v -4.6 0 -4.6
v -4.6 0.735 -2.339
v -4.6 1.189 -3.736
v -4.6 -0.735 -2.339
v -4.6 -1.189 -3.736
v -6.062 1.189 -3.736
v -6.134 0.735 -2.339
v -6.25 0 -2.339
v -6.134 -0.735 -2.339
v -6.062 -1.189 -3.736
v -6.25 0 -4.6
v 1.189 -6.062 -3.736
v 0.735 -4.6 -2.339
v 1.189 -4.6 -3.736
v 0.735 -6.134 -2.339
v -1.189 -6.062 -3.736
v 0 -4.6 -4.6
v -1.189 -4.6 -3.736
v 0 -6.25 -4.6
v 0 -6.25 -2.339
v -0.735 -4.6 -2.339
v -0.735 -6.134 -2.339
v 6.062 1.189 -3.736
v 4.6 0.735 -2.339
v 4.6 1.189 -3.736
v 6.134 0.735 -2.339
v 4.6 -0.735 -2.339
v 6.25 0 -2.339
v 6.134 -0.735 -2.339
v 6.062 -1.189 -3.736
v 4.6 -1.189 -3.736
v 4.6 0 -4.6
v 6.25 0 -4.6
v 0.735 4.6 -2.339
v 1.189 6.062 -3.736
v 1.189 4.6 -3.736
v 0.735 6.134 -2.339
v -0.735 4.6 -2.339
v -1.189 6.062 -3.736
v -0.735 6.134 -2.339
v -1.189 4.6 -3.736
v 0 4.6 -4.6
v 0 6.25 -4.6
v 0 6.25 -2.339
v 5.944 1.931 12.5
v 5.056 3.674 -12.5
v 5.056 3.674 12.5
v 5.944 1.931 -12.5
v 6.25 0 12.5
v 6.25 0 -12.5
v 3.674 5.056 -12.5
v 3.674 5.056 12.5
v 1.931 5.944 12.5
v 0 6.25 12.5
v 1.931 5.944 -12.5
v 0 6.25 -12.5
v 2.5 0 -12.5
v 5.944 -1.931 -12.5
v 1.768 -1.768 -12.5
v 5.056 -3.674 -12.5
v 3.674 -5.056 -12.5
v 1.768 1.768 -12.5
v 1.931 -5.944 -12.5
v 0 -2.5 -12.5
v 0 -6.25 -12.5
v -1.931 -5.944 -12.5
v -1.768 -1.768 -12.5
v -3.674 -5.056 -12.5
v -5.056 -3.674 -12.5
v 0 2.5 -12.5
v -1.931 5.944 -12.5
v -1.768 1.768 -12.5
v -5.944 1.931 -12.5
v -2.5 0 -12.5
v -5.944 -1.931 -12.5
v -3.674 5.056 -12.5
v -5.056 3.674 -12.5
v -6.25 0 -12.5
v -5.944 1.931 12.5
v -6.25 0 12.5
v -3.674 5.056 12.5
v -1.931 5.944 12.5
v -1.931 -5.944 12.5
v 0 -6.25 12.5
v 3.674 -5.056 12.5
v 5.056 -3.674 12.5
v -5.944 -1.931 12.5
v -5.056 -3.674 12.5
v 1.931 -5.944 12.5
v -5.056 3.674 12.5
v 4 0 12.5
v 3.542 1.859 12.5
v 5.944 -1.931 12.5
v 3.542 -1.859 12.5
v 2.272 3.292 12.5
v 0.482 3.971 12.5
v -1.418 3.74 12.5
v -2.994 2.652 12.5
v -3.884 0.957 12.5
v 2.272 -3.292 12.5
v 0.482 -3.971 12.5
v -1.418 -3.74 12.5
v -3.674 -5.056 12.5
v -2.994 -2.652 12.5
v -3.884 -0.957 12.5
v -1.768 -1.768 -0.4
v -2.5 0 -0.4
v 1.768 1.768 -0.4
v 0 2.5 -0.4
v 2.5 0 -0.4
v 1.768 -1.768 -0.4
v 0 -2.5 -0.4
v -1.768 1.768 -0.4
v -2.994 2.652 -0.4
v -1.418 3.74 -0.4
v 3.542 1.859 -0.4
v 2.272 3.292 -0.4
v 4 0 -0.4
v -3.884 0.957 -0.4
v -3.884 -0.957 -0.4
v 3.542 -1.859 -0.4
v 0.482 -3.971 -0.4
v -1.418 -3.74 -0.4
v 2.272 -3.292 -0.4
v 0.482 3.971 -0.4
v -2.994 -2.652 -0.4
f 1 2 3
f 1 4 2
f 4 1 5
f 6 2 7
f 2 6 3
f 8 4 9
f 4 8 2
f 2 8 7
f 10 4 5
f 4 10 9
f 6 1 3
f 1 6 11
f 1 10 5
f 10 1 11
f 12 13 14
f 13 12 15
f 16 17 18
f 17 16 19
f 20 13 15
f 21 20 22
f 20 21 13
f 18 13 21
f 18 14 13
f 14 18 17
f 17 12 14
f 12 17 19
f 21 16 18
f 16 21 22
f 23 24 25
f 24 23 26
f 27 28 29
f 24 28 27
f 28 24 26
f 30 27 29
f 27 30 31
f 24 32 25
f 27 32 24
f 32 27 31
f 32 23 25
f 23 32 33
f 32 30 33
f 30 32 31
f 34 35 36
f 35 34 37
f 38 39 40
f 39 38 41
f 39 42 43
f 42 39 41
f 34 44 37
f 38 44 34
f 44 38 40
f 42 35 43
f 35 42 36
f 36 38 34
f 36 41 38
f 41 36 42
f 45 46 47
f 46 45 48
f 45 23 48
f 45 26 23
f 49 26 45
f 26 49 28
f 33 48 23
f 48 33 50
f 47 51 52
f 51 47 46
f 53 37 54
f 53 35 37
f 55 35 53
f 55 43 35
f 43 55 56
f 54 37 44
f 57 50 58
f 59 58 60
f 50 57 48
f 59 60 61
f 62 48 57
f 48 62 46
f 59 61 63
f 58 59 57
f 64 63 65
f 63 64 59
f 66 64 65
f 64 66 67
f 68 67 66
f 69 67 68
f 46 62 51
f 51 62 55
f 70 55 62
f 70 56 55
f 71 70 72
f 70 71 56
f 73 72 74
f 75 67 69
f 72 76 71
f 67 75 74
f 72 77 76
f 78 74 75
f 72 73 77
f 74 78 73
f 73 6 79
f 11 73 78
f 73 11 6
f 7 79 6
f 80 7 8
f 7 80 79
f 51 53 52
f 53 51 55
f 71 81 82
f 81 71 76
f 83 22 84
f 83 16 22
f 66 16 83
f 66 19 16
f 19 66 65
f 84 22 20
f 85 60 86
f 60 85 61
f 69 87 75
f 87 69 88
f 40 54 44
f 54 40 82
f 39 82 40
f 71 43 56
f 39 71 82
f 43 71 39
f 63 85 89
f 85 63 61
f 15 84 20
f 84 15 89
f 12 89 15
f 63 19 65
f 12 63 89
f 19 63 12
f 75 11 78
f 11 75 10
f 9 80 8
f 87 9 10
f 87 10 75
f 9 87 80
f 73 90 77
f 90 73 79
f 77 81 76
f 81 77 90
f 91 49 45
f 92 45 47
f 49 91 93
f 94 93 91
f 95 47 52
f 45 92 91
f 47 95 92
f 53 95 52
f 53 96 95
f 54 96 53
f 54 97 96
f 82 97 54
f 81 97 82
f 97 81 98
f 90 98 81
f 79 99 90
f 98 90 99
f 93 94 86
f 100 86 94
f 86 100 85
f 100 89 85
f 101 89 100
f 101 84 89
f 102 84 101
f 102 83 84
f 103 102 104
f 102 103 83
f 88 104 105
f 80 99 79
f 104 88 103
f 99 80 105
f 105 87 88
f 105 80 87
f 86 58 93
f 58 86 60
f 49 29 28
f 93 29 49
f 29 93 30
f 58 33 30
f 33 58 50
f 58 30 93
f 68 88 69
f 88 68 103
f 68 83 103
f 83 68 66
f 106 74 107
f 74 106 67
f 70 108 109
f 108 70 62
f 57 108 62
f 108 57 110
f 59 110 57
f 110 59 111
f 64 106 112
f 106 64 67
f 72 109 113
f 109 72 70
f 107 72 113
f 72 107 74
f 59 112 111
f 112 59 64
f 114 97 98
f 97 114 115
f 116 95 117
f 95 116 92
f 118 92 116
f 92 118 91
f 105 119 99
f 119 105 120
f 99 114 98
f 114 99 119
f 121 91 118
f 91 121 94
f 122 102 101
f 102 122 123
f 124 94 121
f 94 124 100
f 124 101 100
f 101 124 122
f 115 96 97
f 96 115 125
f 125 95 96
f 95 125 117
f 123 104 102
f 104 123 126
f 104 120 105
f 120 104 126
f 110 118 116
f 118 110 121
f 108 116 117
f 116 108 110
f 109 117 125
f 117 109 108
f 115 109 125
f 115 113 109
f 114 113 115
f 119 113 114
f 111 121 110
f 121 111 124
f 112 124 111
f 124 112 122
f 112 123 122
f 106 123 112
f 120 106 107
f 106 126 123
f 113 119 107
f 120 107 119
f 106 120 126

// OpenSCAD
// Parameters
outer_diameter_mm = 12.5; //[6.25:25:0.1]
overall_length_mm = 25; //[12.5:50:0.1]
bore1_diameter_mm = 5; //[2.5:10:0.1]
bore2_diameter_mm = 8; //[4:16:0.1]
bore1_depth_mm = 12.5; //[6.25:25:0.1]
bore2_depth_mm = 12.5; //[6.25:25:0.1]
center_divider_thickness_mm = 0; //[0:3:0.1]
grub_screw_count_per_end = 2; //[1:4:1]
grub_screw_angular_spacing_deg = 90; //[30:180:1]
grub_screw_offset_from_end_mm = 5; //[2.5:10:0.1]
grub_screw_hole_diameter_mm = 2.5; //[1.5:4:0.1]
grub_screw_hole_depth_mm = 5; //[2.5:10:0.1]
grub_screw_seat_diameter_mm = 4.8; //[3.5:8:0.1]
grub_screw_seat_depth_mm = 1.5; //[0:4:0.1]
tolerance_bore_mm = 0; //[-0.2:0.5:0.01]
overlap_mm = 0.8; //[0.2:2:0.1]

// Shaft Coupling - complete geometry
module shaft_coupling() {
  color("Silver") {
    difference() {
      // Coupling body
      cylinder(r=outer_diameter_mm/2, h=overall_length_mm, center=true);

      // Bores
      translate([0, 0, -overall_length_mm/2 + bore1_depth_mm/2])
        cylinder(r=(bore1_diameter_mm + tolerance_bore_mm)/2, h=bore1_depth_mm + overlap_mm, center=true);
      translate([0, 0, overall_length_mm/2 - bore2_depth_mm/2])
        cylinder(r=(bore2_diameter_mm + tolerance_bore_mm)/2, h=bore2_depth_mm + overlap_mm, center=true);

      // Optional center divider
      if (center_divider_thickness_mm > 0) {
        translate([0, 0, 0])
          cube([outer_diameter_mm*1.2, outer_diameter_mm*1.2, center_divider_thickness_mm], center=true);
      }

      // Grub screw holes
      for (end = [-1, 1]) {
        for (angle = [0, grub_screw_angular_spacing_deg]) {
          rotate([0, 90, angle])
            translate([outer_diameter_mm/2 - (grub_screw_hole_depth_mm + overlap_mm)/2, 0, end * (overall_length_mm/2 - grub_screw_offset_from_end_mm)])
              cylinder(r=grub_screw_hole_diameter_mm/2, h=grub_screw_hole_depth_mm + overlap_mm, center=true);
        }
      }

      // Grub screw seats
      for (end = [-1, 1]) {
        for (angle = [0, grub_screw_angular_spacing_deg]) {
          rotate([0, 90, angle])
            translate([outer_diameter_mm/2 - (grub_screw_seat_depth_mm + overlap_mm)/2, 0, end * (overall_length_mm/2 - grub_screw_offset_from_end_mm)])
              cylinder(r=grub_screw_seat_diameter_mm/2, h=grub_screw_seat_depth_mm + overlap_mm, center=true);
        }
      }
    }
  }
}

// Assembly
module assembly() {
  shaft_coupling();
}

assembly();
